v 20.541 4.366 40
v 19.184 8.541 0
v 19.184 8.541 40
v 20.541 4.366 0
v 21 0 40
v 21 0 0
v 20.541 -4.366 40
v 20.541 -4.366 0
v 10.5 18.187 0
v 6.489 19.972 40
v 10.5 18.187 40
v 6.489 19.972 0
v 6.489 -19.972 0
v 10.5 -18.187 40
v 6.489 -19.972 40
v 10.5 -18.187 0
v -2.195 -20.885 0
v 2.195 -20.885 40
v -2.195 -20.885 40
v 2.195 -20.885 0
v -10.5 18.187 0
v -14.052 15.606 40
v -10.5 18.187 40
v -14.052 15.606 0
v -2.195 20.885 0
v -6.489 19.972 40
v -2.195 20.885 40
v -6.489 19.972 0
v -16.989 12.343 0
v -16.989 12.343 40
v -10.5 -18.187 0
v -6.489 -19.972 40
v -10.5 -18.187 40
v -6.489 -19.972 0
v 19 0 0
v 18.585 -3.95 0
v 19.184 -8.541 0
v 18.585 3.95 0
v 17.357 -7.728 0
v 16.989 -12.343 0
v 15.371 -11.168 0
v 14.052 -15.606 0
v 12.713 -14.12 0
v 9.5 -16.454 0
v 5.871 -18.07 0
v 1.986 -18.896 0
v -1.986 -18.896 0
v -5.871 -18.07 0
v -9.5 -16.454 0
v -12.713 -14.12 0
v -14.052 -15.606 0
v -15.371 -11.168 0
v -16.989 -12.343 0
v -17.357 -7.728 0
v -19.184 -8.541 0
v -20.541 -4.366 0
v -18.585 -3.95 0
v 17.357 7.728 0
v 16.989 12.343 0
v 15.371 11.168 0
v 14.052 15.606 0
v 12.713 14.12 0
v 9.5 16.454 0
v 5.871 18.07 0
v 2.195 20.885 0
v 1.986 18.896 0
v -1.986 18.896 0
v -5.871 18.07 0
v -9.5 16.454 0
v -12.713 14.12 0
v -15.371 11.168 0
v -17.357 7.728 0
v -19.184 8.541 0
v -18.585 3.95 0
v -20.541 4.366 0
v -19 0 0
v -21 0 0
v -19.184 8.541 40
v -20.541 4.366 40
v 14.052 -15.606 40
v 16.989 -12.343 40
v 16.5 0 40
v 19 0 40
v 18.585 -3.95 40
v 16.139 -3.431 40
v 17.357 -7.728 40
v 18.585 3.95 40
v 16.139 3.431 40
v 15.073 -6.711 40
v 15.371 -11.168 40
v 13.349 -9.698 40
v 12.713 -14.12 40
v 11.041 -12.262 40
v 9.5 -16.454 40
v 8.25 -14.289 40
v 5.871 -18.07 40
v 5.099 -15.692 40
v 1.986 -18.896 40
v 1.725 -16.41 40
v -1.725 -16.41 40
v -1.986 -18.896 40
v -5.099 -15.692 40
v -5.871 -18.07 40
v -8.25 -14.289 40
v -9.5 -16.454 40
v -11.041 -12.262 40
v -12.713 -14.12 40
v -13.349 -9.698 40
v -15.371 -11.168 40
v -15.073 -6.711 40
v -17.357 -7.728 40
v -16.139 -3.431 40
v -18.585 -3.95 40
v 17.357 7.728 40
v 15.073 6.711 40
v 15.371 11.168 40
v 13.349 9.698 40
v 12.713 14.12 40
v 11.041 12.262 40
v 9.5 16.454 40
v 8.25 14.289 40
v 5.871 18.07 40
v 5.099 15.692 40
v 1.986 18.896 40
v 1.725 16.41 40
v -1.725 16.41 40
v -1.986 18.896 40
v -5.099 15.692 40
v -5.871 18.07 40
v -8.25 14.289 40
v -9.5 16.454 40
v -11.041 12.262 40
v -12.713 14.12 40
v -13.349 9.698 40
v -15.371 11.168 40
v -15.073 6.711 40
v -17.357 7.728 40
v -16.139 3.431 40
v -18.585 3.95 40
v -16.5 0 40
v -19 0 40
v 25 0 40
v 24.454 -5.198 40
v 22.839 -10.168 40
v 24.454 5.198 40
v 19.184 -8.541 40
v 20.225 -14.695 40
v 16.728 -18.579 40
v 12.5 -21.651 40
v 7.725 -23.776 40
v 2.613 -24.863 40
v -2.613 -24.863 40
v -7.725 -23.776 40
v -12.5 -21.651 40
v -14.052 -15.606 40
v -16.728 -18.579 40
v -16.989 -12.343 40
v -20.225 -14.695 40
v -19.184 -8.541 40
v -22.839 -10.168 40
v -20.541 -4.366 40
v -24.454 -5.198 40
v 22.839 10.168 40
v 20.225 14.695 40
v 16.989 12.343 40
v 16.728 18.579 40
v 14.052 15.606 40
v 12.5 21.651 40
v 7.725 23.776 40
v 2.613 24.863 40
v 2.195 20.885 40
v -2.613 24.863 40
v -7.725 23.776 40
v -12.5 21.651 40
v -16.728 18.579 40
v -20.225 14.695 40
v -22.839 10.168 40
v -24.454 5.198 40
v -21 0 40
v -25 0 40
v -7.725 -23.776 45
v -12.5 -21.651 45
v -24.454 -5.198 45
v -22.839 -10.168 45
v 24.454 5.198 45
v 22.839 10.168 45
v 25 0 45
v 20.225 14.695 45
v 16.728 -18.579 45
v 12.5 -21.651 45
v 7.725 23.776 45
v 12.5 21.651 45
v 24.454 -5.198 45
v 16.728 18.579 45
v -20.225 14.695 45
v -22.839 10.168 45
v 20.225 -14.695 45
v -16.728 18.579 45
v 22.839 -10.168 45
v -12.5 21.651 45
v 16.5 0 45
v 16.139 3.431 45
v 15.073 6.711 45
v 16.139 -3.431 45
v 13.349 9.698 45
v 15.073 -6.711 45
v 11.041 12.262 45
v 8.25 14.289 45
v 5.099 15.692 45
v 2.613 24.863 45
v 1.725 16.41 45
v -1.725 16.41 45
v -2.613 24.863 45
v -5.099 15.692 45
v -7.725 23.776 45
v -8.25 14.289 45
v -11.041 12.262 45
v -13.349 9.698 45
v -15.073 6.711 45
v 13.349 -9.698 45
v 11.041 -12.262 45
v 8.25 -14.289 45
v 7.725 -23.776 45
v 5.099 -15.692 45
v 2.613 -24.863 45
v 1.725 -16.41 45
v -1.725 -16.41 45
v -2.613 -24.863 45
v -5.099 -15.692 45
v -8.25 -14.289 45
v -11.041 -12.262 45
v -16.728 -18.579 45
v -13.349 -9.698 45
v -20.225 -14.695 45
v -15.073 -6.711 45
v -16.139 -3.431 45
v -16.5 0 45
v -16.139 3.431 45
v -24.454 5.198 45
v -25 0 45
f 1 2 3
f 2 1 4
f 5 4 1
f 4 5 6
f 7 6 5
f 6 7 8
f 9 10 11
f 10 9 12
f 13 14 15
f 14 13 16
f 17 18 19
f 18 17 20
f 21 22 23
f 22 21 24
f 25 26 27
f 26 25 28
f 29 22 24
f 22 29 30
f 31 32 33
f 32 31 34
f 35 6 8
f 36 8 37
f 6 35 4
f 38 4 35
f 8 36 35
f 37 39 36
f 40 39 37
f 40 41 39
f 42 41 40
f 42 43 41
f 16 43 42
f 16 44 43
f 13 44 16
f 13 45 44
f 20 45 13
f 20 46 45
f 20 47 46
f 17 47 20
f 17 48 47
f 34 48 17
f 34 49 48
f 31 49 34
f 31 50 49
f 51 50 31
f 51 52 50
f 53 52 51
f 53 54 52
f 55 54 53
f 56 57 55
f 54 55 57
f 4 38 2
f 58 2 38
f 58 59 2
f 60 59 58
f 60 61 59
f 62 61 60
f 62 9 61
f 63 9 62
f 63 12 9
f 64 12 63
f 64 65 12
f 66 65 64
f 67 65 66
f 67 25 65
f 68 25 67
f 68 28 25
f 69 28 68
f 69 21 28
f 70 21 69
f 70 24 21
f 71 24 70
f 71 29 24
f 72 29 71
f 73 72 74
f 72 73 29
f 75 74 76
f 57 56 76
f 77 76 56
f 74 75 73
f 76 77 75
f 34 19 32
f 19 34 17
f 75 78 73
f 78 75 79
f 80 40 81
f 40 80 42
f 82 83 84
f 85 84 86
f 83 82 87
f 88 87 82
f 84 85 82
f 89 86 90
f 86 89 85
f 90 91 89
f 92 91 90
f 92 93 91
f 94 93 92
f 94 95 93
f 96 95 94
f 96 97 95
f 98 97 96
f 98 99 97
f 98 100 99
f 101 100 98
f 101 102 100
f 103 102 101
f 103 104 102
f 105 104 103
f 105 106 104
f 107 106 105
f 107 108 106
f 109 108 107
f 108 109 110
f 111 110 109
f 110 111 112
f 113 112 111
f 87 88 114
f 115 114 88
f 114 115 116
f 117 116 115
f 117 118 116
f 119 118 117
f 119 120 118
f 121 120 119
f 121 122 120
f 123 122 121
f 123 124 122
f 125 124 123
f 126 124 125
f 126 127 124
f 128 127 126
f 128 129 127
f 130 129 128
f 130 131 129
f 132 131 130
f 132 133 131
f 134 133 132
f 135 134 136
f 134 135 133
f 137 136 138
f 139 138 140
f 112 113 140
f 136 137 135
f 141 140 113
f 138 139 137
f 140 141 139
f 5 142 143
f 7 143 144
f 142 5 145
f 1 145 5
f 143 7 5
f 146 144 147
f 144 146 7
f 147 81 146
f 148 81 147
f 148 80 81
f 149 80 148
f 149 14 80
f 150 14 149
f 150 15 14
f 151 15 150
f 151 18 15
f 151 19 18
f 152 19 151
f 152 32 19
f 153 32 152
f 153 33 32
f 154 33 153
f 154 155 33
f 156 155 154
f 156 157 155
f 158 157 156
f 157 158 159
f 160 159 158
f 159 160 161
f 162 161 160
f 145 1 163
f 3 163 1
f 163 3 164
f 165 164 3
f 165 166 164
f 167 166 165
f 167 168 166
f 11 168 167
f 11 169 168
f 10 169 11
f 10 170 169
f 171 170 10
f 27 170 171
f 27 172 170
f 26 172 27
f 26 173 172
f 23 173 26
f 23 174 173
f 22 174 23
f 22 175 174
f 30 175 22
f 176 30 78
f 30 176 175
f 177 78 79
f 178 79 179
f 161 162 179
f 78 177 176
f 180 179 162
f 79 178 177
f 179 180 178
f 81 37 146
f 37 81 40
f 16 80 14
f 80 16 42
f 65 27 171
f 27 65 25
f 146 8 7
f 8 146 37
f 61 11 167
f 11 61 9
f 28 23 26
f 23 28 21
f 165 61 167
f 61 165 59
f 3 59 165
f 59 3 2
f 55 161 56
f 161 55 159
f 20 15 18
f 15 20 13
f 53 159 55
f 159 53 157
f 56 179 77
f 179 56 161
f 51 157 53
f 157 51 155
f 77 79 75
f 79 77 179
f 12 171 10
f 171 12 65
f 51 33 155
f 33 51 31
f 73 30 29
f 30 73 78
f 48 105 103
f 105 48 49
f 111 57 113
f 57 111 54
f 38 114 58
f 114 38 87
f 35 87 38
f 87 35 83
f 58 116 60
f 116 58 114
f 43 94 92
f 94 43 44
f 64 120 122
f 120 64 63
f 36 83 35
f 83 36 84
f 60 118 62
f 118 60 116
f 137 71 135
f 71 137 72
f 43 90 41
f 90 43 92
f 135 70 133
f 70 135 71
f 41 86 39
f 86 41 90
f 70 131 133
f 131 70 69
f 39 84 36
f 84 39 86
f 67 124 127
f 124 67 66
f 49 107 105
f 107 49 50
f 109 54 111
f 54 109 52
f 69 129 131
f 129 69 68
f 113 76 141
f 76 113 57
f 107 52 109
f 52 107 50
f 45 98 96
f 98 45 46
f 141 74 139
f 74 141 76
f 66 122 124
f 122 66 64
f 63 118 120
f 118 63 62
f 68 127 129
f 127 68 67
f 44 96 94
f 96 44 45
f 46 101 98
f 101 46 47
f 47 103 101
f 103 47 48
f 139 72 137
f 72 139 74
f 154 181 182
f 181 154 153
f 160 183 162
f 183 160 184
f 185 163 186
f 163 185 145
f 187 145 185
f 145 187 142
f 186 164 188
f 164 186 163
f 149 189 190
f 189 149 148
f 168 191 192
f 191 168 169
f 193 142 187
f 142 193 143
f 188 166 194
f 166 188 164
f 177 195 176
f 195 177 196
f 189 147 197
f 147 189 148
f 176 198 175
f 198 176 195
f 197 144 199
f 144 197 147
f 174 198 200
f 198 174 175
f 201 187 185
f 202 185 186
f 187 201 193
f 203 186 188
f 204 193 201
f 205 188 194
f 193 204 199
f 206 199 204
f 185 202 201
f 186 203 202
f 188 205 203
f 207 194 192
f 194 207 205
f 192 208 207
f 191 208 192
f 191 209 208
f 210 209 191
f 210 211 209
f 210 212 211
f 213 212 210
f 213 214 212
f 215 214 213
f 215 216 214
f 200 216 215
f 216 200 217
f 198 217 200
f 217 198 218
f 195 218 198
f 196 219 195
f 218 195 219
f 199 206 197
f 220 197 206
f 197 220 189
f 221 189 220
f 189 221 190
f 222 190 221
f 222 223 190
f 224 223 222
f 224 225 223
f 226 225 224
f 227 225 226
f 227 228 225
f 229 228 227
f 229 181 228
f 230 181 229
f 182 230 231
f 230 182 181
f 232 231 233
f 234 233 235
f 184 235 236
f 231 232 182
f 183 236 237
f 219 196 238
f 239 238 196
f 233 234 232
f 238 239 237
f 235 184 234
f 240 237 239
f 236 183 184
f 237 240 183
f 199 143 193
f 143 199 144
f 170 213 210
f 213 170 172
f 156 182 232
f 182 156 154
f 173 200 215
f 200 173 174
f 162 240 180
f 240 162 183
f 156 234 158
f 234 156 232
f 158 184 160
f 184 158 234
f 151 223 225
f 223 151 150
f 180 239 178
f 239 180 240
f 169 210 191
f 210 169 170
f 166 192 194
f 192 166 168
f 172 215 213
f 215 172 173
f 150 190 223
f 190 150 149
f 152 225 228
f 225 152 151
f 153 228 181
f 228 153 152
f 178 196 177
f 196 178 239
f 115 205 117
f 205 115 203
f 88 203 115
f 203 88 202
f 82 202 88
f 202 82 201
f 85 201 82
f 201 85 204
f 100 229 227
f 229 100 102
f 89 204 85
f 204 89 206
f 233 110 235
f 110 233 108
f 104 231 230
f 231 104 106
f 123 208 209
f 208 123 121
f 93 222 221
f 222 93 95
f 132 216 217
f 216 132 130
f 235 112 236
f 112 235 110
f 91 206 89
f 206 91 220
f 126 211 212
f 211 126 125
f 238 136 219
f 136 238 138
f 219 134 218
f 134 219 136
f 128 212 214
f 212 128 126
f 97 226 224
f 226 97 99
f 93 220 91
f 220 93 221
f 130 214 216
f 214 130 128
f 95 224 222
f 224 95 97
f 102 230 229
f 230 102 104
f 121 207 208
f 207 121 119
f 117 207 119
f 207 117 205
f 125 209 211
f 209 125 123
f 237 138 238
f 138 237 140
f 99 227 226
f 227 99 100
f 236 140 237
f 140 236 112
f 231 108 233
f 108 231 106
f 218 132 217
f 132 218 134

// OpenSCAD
difference(){
cylinder(r=21,h=40);
cylinder(r=19,h=40);
}

translate([0,0,40]){ 
    difference(){ 
        union(){
            cylinder();
            cylinder(r=25,h=5);
        }
 
    cylinder(r=16.5,h=60);
    }
}
